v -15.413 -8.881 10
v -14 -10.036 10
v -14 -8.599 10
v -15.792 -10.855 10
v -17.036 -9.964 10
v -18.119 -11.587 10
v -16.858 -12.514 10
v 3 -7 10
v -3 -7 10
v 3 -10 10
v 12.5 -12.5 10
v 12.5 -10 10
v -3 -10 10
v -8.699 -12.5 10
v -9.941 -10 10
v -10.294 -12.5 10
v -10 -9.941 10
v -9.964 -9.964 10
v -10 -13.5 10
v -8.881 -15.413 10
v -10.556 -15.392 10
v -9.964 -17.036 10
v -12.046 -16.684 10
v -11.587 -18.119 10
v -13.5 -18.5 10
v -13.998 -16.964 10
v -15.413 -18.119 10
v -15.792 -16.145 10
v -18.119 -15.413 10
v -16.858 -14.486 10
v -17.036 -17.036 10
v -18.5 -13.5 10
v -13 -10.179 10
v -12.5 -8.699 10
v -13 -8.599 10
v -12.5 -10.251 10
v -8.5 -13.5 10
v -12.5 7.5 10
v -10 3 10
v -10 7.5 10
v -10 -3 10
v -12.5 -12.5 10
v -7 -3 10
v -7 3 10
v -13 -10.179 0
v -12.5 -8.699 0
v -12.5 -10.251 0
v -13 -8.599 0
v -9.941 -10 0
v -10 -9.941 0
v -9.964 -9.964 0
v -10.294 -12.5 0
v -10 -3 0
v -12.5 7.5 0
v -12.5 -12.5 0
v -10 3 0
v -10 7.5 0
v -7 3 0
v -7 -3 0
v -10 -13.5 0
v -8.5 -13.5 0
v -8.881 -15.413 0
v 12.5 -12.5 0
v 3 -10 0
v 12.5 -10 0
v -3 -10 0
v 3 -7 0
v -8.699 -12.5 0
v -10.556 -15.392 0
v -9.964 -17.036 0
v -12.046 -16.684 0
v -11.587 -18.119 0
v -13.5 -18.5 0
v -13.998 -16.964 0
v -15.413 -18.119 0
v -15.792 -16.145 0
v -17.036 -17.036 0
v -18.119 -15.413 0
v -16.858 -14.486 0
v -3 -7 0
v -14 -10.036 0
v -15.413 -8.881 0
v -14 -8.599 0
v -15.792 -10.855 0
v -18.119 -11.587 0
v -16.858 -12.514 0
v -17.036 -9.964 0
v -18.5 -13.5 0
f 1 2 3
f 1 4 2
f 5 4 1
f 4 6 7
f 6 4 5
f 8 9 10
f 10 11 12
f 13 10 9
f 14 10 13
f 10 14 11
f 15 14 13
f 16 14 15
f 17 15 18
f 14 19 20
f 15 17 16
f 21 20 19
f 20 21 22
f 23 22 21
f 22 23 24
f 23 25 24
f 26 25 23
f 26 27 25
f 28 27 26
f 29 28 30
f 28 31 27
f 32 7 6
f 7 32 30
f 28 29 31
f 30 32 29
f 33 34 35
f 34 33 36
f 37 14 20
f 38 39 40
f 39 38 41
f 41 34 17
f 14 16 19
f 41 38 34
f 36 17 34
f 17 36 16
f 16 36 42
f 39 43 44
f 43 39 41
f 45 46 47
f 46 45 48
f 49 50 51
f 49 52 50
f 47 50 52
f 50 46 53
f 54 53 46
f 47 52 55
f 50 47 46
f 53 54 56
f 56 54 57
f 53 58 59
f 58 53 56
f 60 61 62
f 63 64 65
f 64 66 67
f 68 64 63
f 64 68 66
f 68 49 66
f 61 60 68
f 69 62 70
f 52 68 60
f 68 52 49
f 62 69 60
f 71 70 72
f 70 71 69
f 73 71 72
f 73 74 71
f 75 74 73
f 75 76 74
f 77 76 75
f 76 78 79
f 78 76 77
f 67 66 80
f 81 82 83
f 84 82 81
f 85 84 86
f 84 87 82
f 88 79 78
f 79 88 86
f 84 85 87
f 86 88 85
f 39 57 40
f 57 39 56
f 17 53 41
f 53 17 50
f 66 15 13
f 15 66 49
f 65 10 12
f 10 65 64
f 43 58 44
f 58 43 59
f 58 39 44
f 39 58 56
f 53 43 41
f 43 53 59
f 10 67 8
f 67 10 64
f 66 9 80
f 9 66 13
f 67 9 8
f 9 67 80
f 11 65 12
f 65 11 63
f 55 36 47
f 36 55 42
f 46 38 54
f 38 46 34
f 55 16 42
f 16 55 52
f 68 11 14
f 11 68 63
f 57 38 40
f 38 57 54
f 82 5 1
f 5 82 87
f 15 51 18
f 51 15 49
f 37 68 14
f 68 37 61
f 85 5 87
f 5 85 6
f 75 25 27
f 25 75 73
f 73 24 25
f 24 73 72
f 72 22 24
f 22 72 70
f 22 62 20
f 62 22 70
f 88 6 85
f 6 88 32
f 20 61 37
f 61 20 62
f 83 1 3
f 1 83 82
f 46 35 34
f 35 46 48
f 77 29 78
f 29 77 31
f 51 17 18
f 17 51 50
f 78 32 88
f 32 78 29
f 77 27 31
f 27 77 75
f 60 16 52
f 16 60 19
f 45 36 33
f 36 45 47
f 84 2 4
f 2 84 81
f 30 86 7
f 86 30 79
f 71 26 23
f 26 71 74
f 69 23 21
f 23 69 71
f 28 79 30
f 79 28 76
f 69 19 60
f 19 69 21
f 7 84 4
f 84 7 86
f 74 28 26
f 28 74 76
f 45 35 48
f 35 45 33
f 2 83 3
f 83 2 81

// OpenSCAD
// file: inc/functions.scad
// PRUSA iteration3
// Functions used in many files
// GNU GPL v3
// Josef Průša <josefprusa@me.com>
// Václav 'ax' Hůla <axtheb@gmail.com>
// Vlnofka <>
// http://www.reprap.org/wiki/Prusa_Mendel
// http://github.com/josefprusa/Prusa3


module nut(d,h,horizontal=true){
    cornerdiameter =  (d / 2) / cos (180 / 6);
    cylinder(h = h, r = cornerdiameter, $fn = 6);
    if(horizontal){
        for(i = [1:6]){
            rotate([0,0,60*i]) translate([-cornerdiameter-0.2,0,0]) rotate([0,0,-45]) cube([2,2,h]);
        }
    }
}

module fillet(radius, height=100, $fn=0) {
    //this creates acutal fillet
    translate([-radius, -radius, -height / 2 - 0.02]) difference() {
        cube([radius * 2, radius * 2, height + 0.04]);
        if ($fn == 0 && (radius == 2 || radius == 3 || radius == 4)) {
            cylinder(r=radius, h=height + 0.04, $fn=4 * radius);
        } else {
            cylinder(r=radius, h=height + 0.04, $fn=$fn);
        }

    }
}

module cube_fillet(size, radius=-1, vertical=[3,3,3,3], top=[0,0,0,0], bottom=[0,0,0,0], center=false, $fn=0){
    //
    if (use_fillets == 1) {
        if (center) {
            cube_fillet_inside(size, radius, vertical, top, bottom, $fn);
        } else {
            translate([size[0]/2, size[1]/2, size[2]/2])
                cube_fillet_inside(size, radius, vertical, top, bottom, $fn);
        }
    } else {
        if (use_fillets == 2) {
            if (center) {
                cube_fillet_inside(size, radius, vertical, top, bottom, 4);
            } else {
                translate([size[0]/2, size[1]/2, size[2]/2])
                    cube_fillet_inside(size, radius, vertical, top, bottom, 4);
            }

        } else {
            cube(size, center);
        }
    }

}

module cube_negative_fillet(size, radius=-1, vertical=[3,3,3,3], top=[0,0,0,0], bottom=[0,0,0,0], $fn=0){

    j=[1,0,1,0];

    for (i=[0:3]) {
        if (radius > -1) {
            rotate([0, 0, 90*i]) translate([size[1-j[i]]/2, size[j[i]]/2, 0]) fillet(radius, size[2], $fn=$fn);
        } else {
            rotate([0, 0, 90*i]) translate([size[1-j[i]]/2, size[j[i]]/2, 0]) fillet(vertical[i], size[2], $fn=$fn);
        }
        rotate([90*i, -90, 0]) translate([size[2]/2, size[j[i]]/2, 0 ]) fillet(top[i], size[1-j[i]], $fn=$fn);
        rotate([90*(4-i), 90, 0]) translate([size[2]/2, size[j[i]]/2, 0]) fillet(bottom[i], size[1-j[i]], $fn=$fn);

    }
}

module cube_fillet_inside(size, radius=-1, vertical=[3,3,3,3], top=[0,0,0,0], bottom=[0,0,0,0], $fn=0){
    //makes CENTERED cube with round corners
    // if you give it radius, it will fillet vertical corners.
    //othervise use vertical, top, bottom arrays
    //when viewed from top, it starts in upper right corner (+x,+y quadrant) , goes counterclockwise
    //top/bottom fillet starts in direction of Y axis and goes CCW too


    if (radius == 0) {
        cube(size, center=true);
    } else {
        difference() {
            cube(size, center=true);
            cube_negative_fillet(size, radius, vertical, top, bottom, $fn);
        }
    }
}


module nema17(places=[1,1,1,1], size=15.5, h=10, holes=false, shadow=false, $fn=24){
    for (i=[0:3]) {
        if (places[i] == 1) {
            rotate([0, 0, 90*i]) translate([size, size, 0]) {
                if (holes) {
                    rotate([0, 0, -90*i])  translate([0,0,-10]) screw(r=1.7, slant=false, head_drop=13, $fn=$fn, h=h+12);
                } else {
                    rotate([0, 0, -90*i]) cylinder(h=h, r=5.5, $fn=$fn);
                }
            }
        }
    }
    if (shadow != false) {
        %translate ([0, 0, shadow+21+3]) cube([42,42,42], center = true);
    //flange
        %translate ([0, 0, shadow+21+3-21-1]) cylinder(r=11,h=2, center = true, $fn=20);
    //shaft
        %translate ([0, 0, shadow+21+3-21-7]) cylinder(r=2.5,h=14, center = true);
    }
}

module screw(h=20, r=2, r_head=3.5, head_drop=0, slant=i_am_box, poly=false, $fn=0){
    //makes screw with head
    //for substraction as screw hole
    if (poly) {
        cylinder_poly(h=h, r=r, $fn=$fn);
    } else {
        cylinder(h=h, r=r, $fn=$fn);
    }
    if (slant) {
        translate([0, 0, head_drop-0.01]) cylinder(h=r_head, r2=0, r1=r_head, $fn=$fn);
    }

    if (head_drop > 0) {
        translate([0, 0, -0.01]) cylinder(h=head_drop+0.01, r=r_head, $fn=$fn);
    }
}

module plate_screw(long=0) {
    if (i_am_box == 0) {
        translate([0, 0, -long]) screw(head_drop=14 + long, h=30 + long, r_head=3.6, r=1.7, $fn=24, slant=false);
    } else {
        translate([0, 0, -2 - long]) screw(head_drop=14 + long, h=30 + long, r_head=4.5, r=2, $fn=24, slant=true);
    }
}

//radius of the idler assembly (to surface that touches belt, ignoring guide walls)
function idler_assy_r_inner(idler_bearing) = (idler_bearing[0] / 2) + (6 * single_wall_width + 0.2) * idler_bearing[3];
//outer radius of the idler assembly (to smooth side of belt) 
function idler_assy_r_outer(idler_bearing) = idler_assy_r_inner(idler_bearing) + belt_thickness + 1;

module ext2020(l=20) {
  translate([0,0,l/2])
  difference(){
    cube([20,20,l], center=true);
    translate([10-1.5,0,0])cube([3,6,l], center=true);
    translate([-10+1.5,0,0])cube([3,6,l], center=true);
    translate([0,10-1.5,0])cube([6,3,l], center=true);
    translate([0,-10+1.5,0])cube([6,3,l], center=true);
  }
}

module idler_assy(idler_bearing = [22, 7, 8, 1]) {

    //bearing axle
    translate([0,0,-1]) cylinder(h = 120, r=(idler_bearing[2] + 1) / 2, $fn=small_hole_segments, center=true);
    //bearing shadow
    %cylinder(h = idler_bearing[1], r=idler_bearing[0]/2, center=true);
    //belt shadow
    %cylinder(h = belt_width, r=idler_assy_r_outer(idler_bearing), center=true);

    cylinder(h = idler_width + 1, r=idler_assy_r_outer(idler_bearing) + 0.5, center=true);
}

module belt(len, side = 0){
    //belt. To be substracted from model
    //len is in +Z, smooth side in +X, Y centered
    translate([-0.5, 0, 0]) maketeeth(len);
    translate([0, -4.5, -0.01]) cube([belt_thickness, 9, len + 0.02]);
    if (side != 0) {
    translate([0, -4.5 + side, -0.01]) cube_fillet([belt_thickness, 9, len + 0.02], vertical = [3, 0, 0, 0]);
    }
}


module maketeeth(len){
    //Belt teeth. 
    for (i = [0 : len / belt_tooth_distance]) {
        translate([0, 0, i * belt_tooth_distance]) cube([2, 9, belt_tooth_distance * belt_tooth_ratio], center = true);
    }
}
// main file
use<inc/functions.scad>

difference() 
{
  translate([0,0,(10/2)])cube([25,25,10],center=true);
  ext2020(l=10);
    translate([6,6,10/2])cube([25,25,10],center=true);
    translate([0,20,10/2])cube([25,25,10],center=true);
    translate([10.6,2.5,10/2])cube([6,25,10],center=true);
}

translate([-25/2 - 1, -25/2 -1, 0])
{
  difference()
  {
  cylinder(r=5, h=10);
  cylinder(r=5-1.5, h=10);
  translate([0,6/2,5])cube([1,9,10],center=true);
  }
}
